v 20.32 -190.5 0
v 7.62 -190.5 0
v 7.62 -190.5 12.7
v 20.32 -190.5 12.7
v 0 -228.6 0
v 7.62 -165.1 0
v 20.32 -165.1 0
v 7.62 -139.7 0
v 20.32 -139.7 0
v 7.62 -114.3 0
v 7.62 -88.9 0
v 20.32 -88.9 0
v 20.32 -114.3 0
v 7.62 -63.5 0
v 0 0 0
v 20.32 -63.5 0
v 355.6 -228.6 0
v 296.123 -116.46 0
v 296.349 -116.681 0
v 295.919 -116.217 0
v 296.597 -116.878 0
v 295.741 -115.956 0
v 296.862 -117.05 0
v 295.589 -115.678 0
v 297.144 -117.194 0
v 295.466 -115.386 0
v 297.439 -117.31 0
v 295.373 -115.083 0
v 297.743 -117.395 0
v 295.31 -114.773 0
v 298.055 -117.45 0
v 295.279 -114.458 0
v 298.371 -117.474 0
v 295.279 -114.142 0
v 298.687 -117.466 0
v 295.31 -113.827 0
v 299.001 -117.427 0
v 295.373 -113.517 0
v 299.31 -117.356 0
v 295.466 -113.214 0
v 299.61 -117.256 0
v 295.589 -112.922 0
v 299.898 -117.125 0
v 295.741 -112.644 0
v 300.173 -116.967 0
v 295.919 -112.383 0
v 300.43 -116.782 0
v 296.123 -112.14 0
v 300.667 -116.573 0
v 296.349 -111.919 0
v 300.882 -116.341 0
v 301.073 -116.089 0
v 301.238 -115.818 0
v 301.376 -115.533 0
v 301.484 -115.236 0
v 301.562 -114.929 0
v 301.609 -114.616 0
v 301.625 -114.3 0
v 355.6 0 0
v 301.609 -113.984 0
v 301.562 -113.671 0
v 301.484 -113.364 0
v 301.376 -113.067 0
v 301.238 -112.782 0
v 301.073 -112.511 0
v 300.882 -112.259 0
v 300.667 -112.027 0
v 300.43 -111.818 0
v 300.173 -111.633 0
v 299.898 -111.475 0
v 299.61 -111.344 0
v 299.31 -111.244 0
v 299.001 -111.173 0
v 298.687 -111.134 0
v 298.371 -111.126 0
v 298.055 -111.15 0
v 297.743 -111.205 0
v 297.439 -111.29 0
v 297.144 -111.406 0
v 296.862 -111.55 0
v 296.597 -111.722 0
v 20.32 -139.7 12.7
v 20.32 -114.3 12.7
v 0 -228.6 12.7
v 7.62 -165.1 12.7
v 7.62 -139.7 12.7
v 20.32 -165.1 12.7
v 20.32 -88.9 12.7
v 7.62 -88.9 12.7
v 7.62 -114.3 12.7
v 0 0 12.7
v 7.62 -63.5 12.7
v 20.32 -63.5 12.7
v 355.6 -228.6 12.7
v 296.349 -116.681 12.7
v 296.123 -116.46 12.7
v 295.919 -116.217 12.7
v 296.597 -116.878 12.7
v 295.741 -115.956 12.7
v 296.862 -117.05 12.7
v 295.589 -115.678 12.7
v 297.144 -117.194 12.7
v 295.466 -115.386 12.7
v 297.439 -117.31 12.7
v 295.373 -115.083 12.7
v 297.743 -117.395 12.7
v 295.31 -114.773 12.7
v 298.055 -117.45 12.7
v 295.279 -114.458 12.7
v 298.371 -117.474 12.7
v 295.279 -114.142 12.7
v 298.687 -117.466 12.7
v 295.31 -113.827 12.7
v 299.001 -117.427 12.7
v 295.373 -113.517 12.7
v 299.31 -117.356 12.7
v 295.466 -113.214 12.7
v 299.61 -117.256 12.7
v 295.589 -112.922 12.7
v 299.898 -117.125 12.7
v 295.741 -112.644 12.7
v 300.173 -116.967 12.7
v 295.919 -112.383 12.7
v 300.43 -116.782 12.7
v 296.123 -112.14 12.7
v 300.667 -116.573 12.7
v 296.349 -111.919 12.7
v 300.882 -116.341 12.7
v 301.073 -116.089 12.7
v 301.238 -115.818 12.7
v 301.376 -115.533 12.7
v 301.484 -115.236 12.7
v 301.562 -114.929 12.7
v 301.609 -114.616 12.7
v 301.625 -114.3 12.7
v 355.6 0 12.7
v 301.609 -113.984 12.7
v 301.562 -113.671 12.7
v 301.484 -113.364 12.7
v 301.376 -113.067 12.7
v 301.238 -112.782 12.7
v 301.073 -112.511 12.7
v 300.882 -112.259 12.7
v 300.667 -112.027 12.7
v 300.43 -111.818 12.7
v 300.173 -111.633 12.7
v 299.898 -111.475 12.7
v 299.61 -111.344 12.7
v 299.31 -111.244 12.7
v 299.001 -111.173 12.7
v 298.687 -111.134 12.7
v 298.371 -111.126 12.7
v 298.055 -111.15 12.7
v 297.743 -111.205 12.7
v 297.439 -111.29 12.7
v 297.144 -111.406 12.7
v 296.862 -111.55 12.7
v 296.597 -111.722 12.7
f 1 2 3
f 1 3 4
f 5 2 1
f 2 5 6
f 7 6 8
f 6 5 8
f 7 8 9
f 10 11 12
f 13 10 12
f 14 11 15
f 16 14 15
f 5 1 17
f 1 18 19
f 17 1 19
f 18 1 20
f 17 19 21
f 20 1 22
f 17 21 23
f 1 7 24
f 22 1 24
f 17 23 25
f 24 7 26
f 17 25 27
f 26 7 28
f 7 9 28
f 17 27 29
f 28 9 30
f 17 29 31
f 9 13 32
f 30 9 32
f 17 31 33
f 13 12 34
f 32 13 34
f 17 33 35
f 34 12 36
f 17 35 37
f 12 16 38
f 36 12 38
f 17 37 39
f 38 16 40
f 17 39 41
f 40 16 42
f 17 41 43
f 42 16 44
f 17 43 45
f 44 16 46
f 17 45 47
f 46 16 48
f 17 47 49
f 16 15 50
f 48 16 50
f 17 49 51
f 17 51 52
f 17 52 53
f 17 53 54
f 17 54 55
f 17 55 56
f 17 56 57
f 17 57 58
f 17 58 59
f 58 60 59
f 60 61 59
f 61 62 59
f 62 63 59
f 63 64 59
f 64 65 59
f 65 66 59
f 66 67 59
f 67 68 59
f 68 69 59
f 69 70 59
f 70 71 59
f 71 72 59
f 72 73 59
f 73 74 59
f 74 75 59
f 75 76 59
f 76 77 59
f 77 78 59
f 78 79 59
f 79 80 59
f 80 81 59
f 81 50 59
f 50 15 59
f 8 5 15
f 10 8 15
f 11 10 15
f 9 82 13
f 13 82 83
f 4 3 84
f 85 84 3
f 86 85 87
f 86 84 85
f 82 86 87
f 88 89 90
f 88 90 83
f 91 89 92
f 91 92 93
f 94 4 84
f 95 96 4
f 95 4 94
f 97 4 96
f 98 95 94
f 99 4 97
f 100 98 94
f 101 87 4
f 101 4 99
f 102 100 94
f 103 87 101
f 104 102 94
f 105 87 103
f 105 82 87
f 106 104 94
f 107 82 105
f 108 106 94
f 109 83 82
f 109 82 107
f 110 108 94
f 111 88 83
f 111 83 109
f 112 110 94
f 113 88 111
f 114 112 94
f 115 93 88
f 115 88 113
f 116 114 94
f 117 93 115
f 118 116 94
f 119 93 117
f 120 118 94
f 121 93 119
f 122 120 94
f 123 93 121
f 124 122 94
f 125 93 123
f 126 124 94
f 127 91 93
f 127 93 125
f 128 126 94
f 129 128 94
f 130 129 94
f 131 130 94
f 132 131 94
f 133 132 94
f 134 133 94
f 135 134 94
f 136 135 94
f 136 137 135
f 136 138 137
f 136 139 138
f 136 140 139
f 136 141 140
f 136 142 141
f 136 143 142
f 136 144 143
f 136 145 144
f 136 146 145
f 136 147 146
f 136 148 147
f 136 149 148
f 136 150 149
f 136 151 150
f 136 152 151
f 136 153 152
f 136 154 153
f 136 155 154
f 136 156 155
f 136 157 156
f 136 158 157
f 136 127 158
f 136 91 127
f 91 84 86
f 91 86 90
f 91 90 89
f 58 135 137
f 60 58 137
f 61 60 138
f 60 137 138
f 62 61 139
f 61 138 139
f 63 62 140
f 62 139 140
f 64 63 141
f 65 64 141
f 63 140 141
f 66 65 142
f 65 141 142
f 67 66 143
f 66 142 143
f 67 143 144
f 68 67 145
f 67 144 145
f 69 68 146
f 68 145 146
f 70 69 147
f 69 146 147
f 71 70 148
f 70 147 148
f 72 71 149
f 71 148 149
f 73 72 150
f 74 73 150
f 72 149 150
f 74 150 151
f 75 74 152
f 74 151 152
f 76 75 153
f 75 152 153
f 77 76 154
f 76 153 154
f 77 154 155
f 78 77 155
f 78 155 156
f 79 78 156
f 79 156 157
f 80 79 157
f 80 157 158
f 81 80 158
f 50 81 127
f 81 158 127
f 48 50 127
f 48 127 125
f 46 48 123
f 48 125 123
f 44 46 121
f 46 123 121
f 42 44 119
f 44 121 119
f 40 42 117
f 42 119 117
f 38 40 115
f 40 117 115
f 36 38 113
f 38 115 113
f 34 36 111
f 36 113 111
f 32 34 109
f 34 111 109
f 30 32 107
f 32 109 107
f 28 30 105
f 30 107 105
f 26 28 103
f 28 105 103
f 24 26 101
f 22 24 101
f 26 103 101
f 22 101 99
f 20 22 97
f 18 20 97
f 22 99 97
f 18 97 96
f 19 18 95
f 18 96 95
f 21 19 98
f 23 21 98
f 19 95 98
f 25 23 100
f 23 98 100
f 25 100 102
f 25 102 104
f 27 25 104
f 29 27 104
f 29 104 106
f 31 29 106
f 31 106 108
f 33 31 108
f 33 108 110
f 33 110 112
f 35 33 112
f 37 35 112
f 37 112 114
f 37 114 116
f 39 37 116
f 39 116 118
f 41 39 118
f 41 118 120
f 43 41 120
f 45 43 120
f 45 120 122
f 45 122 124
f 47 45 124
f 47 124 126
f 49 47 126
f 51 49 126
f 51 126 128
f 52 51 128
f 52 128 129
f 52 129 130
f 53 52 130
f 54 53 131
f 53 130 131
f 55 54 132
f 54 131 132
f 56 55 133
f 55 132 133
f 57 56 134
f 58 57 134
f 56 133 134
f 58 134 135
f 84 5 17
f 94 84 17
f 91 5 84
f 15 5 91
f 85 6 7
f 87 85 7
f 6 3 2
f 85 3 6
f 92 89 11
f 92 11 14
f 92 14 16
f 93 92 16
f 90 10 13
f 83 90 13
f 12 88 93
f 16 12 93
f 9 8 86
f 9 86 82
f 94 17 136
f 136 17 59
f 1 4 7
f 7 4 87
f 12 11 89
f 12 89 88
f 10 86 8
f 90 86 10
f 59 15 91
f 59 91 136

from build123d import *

# Parameters (mm, degrees)
SKETCH2_W           = 355.6
SKETCH2_H           = 228.6
BOSS_EXTRUDE1_DEPTH = 12.7
SKETCH3_R           = 3.175
CUT_EXTRUDE1_DEPTH  = 12.7
SKETCH4_W           = 12.7
SKETCH4_H           = 25.4
CUT_EXTRUDE2_DEPTH  = 13.7


with BuildPart() as part:
    # Sketch2 → Boss-Extrude1 (new body)
    with BuildSketch(Plane.XY):
        with Locations((177.8, -114.3)):
            Rectangle(SKETCH2_W, SKETCH2_H)
    extrude(amount=BOSS_EXTRUDE1_DEPTH)

    # Sketch3 → Cut-Extrude1 (cut)
    with BuildSketch(Plane.XY.offset(12.7)):
        with Locations((298.45, -114.3)):
            Circle(SKETCH3_R)
    extrude(amount=-CUT_EXTRUDE1_DEPTH, mode=Mode.SUBTRACT)

    # Sketch4 → Cut-Extrude2 (cut, through all)
    with BuildSketch(Plane.XY.offset(12.7)):
        with Locations((13.97, -76.2)):
            Rectangle(SKETCH4_W, SKETCH4_H)
        with Locations((13.97, -127)):
            Rectangle(SKETCH4_W, SKETCH4_H)
        with Locations((13.97, -177.8)):
            Rectangle(SKETCH4_W, SKETCH4_H)
    extrude(amount=-CUT_EXTRUDE2_DEPTH, mode=Mode.SUBTRACT)


solid = part.part
